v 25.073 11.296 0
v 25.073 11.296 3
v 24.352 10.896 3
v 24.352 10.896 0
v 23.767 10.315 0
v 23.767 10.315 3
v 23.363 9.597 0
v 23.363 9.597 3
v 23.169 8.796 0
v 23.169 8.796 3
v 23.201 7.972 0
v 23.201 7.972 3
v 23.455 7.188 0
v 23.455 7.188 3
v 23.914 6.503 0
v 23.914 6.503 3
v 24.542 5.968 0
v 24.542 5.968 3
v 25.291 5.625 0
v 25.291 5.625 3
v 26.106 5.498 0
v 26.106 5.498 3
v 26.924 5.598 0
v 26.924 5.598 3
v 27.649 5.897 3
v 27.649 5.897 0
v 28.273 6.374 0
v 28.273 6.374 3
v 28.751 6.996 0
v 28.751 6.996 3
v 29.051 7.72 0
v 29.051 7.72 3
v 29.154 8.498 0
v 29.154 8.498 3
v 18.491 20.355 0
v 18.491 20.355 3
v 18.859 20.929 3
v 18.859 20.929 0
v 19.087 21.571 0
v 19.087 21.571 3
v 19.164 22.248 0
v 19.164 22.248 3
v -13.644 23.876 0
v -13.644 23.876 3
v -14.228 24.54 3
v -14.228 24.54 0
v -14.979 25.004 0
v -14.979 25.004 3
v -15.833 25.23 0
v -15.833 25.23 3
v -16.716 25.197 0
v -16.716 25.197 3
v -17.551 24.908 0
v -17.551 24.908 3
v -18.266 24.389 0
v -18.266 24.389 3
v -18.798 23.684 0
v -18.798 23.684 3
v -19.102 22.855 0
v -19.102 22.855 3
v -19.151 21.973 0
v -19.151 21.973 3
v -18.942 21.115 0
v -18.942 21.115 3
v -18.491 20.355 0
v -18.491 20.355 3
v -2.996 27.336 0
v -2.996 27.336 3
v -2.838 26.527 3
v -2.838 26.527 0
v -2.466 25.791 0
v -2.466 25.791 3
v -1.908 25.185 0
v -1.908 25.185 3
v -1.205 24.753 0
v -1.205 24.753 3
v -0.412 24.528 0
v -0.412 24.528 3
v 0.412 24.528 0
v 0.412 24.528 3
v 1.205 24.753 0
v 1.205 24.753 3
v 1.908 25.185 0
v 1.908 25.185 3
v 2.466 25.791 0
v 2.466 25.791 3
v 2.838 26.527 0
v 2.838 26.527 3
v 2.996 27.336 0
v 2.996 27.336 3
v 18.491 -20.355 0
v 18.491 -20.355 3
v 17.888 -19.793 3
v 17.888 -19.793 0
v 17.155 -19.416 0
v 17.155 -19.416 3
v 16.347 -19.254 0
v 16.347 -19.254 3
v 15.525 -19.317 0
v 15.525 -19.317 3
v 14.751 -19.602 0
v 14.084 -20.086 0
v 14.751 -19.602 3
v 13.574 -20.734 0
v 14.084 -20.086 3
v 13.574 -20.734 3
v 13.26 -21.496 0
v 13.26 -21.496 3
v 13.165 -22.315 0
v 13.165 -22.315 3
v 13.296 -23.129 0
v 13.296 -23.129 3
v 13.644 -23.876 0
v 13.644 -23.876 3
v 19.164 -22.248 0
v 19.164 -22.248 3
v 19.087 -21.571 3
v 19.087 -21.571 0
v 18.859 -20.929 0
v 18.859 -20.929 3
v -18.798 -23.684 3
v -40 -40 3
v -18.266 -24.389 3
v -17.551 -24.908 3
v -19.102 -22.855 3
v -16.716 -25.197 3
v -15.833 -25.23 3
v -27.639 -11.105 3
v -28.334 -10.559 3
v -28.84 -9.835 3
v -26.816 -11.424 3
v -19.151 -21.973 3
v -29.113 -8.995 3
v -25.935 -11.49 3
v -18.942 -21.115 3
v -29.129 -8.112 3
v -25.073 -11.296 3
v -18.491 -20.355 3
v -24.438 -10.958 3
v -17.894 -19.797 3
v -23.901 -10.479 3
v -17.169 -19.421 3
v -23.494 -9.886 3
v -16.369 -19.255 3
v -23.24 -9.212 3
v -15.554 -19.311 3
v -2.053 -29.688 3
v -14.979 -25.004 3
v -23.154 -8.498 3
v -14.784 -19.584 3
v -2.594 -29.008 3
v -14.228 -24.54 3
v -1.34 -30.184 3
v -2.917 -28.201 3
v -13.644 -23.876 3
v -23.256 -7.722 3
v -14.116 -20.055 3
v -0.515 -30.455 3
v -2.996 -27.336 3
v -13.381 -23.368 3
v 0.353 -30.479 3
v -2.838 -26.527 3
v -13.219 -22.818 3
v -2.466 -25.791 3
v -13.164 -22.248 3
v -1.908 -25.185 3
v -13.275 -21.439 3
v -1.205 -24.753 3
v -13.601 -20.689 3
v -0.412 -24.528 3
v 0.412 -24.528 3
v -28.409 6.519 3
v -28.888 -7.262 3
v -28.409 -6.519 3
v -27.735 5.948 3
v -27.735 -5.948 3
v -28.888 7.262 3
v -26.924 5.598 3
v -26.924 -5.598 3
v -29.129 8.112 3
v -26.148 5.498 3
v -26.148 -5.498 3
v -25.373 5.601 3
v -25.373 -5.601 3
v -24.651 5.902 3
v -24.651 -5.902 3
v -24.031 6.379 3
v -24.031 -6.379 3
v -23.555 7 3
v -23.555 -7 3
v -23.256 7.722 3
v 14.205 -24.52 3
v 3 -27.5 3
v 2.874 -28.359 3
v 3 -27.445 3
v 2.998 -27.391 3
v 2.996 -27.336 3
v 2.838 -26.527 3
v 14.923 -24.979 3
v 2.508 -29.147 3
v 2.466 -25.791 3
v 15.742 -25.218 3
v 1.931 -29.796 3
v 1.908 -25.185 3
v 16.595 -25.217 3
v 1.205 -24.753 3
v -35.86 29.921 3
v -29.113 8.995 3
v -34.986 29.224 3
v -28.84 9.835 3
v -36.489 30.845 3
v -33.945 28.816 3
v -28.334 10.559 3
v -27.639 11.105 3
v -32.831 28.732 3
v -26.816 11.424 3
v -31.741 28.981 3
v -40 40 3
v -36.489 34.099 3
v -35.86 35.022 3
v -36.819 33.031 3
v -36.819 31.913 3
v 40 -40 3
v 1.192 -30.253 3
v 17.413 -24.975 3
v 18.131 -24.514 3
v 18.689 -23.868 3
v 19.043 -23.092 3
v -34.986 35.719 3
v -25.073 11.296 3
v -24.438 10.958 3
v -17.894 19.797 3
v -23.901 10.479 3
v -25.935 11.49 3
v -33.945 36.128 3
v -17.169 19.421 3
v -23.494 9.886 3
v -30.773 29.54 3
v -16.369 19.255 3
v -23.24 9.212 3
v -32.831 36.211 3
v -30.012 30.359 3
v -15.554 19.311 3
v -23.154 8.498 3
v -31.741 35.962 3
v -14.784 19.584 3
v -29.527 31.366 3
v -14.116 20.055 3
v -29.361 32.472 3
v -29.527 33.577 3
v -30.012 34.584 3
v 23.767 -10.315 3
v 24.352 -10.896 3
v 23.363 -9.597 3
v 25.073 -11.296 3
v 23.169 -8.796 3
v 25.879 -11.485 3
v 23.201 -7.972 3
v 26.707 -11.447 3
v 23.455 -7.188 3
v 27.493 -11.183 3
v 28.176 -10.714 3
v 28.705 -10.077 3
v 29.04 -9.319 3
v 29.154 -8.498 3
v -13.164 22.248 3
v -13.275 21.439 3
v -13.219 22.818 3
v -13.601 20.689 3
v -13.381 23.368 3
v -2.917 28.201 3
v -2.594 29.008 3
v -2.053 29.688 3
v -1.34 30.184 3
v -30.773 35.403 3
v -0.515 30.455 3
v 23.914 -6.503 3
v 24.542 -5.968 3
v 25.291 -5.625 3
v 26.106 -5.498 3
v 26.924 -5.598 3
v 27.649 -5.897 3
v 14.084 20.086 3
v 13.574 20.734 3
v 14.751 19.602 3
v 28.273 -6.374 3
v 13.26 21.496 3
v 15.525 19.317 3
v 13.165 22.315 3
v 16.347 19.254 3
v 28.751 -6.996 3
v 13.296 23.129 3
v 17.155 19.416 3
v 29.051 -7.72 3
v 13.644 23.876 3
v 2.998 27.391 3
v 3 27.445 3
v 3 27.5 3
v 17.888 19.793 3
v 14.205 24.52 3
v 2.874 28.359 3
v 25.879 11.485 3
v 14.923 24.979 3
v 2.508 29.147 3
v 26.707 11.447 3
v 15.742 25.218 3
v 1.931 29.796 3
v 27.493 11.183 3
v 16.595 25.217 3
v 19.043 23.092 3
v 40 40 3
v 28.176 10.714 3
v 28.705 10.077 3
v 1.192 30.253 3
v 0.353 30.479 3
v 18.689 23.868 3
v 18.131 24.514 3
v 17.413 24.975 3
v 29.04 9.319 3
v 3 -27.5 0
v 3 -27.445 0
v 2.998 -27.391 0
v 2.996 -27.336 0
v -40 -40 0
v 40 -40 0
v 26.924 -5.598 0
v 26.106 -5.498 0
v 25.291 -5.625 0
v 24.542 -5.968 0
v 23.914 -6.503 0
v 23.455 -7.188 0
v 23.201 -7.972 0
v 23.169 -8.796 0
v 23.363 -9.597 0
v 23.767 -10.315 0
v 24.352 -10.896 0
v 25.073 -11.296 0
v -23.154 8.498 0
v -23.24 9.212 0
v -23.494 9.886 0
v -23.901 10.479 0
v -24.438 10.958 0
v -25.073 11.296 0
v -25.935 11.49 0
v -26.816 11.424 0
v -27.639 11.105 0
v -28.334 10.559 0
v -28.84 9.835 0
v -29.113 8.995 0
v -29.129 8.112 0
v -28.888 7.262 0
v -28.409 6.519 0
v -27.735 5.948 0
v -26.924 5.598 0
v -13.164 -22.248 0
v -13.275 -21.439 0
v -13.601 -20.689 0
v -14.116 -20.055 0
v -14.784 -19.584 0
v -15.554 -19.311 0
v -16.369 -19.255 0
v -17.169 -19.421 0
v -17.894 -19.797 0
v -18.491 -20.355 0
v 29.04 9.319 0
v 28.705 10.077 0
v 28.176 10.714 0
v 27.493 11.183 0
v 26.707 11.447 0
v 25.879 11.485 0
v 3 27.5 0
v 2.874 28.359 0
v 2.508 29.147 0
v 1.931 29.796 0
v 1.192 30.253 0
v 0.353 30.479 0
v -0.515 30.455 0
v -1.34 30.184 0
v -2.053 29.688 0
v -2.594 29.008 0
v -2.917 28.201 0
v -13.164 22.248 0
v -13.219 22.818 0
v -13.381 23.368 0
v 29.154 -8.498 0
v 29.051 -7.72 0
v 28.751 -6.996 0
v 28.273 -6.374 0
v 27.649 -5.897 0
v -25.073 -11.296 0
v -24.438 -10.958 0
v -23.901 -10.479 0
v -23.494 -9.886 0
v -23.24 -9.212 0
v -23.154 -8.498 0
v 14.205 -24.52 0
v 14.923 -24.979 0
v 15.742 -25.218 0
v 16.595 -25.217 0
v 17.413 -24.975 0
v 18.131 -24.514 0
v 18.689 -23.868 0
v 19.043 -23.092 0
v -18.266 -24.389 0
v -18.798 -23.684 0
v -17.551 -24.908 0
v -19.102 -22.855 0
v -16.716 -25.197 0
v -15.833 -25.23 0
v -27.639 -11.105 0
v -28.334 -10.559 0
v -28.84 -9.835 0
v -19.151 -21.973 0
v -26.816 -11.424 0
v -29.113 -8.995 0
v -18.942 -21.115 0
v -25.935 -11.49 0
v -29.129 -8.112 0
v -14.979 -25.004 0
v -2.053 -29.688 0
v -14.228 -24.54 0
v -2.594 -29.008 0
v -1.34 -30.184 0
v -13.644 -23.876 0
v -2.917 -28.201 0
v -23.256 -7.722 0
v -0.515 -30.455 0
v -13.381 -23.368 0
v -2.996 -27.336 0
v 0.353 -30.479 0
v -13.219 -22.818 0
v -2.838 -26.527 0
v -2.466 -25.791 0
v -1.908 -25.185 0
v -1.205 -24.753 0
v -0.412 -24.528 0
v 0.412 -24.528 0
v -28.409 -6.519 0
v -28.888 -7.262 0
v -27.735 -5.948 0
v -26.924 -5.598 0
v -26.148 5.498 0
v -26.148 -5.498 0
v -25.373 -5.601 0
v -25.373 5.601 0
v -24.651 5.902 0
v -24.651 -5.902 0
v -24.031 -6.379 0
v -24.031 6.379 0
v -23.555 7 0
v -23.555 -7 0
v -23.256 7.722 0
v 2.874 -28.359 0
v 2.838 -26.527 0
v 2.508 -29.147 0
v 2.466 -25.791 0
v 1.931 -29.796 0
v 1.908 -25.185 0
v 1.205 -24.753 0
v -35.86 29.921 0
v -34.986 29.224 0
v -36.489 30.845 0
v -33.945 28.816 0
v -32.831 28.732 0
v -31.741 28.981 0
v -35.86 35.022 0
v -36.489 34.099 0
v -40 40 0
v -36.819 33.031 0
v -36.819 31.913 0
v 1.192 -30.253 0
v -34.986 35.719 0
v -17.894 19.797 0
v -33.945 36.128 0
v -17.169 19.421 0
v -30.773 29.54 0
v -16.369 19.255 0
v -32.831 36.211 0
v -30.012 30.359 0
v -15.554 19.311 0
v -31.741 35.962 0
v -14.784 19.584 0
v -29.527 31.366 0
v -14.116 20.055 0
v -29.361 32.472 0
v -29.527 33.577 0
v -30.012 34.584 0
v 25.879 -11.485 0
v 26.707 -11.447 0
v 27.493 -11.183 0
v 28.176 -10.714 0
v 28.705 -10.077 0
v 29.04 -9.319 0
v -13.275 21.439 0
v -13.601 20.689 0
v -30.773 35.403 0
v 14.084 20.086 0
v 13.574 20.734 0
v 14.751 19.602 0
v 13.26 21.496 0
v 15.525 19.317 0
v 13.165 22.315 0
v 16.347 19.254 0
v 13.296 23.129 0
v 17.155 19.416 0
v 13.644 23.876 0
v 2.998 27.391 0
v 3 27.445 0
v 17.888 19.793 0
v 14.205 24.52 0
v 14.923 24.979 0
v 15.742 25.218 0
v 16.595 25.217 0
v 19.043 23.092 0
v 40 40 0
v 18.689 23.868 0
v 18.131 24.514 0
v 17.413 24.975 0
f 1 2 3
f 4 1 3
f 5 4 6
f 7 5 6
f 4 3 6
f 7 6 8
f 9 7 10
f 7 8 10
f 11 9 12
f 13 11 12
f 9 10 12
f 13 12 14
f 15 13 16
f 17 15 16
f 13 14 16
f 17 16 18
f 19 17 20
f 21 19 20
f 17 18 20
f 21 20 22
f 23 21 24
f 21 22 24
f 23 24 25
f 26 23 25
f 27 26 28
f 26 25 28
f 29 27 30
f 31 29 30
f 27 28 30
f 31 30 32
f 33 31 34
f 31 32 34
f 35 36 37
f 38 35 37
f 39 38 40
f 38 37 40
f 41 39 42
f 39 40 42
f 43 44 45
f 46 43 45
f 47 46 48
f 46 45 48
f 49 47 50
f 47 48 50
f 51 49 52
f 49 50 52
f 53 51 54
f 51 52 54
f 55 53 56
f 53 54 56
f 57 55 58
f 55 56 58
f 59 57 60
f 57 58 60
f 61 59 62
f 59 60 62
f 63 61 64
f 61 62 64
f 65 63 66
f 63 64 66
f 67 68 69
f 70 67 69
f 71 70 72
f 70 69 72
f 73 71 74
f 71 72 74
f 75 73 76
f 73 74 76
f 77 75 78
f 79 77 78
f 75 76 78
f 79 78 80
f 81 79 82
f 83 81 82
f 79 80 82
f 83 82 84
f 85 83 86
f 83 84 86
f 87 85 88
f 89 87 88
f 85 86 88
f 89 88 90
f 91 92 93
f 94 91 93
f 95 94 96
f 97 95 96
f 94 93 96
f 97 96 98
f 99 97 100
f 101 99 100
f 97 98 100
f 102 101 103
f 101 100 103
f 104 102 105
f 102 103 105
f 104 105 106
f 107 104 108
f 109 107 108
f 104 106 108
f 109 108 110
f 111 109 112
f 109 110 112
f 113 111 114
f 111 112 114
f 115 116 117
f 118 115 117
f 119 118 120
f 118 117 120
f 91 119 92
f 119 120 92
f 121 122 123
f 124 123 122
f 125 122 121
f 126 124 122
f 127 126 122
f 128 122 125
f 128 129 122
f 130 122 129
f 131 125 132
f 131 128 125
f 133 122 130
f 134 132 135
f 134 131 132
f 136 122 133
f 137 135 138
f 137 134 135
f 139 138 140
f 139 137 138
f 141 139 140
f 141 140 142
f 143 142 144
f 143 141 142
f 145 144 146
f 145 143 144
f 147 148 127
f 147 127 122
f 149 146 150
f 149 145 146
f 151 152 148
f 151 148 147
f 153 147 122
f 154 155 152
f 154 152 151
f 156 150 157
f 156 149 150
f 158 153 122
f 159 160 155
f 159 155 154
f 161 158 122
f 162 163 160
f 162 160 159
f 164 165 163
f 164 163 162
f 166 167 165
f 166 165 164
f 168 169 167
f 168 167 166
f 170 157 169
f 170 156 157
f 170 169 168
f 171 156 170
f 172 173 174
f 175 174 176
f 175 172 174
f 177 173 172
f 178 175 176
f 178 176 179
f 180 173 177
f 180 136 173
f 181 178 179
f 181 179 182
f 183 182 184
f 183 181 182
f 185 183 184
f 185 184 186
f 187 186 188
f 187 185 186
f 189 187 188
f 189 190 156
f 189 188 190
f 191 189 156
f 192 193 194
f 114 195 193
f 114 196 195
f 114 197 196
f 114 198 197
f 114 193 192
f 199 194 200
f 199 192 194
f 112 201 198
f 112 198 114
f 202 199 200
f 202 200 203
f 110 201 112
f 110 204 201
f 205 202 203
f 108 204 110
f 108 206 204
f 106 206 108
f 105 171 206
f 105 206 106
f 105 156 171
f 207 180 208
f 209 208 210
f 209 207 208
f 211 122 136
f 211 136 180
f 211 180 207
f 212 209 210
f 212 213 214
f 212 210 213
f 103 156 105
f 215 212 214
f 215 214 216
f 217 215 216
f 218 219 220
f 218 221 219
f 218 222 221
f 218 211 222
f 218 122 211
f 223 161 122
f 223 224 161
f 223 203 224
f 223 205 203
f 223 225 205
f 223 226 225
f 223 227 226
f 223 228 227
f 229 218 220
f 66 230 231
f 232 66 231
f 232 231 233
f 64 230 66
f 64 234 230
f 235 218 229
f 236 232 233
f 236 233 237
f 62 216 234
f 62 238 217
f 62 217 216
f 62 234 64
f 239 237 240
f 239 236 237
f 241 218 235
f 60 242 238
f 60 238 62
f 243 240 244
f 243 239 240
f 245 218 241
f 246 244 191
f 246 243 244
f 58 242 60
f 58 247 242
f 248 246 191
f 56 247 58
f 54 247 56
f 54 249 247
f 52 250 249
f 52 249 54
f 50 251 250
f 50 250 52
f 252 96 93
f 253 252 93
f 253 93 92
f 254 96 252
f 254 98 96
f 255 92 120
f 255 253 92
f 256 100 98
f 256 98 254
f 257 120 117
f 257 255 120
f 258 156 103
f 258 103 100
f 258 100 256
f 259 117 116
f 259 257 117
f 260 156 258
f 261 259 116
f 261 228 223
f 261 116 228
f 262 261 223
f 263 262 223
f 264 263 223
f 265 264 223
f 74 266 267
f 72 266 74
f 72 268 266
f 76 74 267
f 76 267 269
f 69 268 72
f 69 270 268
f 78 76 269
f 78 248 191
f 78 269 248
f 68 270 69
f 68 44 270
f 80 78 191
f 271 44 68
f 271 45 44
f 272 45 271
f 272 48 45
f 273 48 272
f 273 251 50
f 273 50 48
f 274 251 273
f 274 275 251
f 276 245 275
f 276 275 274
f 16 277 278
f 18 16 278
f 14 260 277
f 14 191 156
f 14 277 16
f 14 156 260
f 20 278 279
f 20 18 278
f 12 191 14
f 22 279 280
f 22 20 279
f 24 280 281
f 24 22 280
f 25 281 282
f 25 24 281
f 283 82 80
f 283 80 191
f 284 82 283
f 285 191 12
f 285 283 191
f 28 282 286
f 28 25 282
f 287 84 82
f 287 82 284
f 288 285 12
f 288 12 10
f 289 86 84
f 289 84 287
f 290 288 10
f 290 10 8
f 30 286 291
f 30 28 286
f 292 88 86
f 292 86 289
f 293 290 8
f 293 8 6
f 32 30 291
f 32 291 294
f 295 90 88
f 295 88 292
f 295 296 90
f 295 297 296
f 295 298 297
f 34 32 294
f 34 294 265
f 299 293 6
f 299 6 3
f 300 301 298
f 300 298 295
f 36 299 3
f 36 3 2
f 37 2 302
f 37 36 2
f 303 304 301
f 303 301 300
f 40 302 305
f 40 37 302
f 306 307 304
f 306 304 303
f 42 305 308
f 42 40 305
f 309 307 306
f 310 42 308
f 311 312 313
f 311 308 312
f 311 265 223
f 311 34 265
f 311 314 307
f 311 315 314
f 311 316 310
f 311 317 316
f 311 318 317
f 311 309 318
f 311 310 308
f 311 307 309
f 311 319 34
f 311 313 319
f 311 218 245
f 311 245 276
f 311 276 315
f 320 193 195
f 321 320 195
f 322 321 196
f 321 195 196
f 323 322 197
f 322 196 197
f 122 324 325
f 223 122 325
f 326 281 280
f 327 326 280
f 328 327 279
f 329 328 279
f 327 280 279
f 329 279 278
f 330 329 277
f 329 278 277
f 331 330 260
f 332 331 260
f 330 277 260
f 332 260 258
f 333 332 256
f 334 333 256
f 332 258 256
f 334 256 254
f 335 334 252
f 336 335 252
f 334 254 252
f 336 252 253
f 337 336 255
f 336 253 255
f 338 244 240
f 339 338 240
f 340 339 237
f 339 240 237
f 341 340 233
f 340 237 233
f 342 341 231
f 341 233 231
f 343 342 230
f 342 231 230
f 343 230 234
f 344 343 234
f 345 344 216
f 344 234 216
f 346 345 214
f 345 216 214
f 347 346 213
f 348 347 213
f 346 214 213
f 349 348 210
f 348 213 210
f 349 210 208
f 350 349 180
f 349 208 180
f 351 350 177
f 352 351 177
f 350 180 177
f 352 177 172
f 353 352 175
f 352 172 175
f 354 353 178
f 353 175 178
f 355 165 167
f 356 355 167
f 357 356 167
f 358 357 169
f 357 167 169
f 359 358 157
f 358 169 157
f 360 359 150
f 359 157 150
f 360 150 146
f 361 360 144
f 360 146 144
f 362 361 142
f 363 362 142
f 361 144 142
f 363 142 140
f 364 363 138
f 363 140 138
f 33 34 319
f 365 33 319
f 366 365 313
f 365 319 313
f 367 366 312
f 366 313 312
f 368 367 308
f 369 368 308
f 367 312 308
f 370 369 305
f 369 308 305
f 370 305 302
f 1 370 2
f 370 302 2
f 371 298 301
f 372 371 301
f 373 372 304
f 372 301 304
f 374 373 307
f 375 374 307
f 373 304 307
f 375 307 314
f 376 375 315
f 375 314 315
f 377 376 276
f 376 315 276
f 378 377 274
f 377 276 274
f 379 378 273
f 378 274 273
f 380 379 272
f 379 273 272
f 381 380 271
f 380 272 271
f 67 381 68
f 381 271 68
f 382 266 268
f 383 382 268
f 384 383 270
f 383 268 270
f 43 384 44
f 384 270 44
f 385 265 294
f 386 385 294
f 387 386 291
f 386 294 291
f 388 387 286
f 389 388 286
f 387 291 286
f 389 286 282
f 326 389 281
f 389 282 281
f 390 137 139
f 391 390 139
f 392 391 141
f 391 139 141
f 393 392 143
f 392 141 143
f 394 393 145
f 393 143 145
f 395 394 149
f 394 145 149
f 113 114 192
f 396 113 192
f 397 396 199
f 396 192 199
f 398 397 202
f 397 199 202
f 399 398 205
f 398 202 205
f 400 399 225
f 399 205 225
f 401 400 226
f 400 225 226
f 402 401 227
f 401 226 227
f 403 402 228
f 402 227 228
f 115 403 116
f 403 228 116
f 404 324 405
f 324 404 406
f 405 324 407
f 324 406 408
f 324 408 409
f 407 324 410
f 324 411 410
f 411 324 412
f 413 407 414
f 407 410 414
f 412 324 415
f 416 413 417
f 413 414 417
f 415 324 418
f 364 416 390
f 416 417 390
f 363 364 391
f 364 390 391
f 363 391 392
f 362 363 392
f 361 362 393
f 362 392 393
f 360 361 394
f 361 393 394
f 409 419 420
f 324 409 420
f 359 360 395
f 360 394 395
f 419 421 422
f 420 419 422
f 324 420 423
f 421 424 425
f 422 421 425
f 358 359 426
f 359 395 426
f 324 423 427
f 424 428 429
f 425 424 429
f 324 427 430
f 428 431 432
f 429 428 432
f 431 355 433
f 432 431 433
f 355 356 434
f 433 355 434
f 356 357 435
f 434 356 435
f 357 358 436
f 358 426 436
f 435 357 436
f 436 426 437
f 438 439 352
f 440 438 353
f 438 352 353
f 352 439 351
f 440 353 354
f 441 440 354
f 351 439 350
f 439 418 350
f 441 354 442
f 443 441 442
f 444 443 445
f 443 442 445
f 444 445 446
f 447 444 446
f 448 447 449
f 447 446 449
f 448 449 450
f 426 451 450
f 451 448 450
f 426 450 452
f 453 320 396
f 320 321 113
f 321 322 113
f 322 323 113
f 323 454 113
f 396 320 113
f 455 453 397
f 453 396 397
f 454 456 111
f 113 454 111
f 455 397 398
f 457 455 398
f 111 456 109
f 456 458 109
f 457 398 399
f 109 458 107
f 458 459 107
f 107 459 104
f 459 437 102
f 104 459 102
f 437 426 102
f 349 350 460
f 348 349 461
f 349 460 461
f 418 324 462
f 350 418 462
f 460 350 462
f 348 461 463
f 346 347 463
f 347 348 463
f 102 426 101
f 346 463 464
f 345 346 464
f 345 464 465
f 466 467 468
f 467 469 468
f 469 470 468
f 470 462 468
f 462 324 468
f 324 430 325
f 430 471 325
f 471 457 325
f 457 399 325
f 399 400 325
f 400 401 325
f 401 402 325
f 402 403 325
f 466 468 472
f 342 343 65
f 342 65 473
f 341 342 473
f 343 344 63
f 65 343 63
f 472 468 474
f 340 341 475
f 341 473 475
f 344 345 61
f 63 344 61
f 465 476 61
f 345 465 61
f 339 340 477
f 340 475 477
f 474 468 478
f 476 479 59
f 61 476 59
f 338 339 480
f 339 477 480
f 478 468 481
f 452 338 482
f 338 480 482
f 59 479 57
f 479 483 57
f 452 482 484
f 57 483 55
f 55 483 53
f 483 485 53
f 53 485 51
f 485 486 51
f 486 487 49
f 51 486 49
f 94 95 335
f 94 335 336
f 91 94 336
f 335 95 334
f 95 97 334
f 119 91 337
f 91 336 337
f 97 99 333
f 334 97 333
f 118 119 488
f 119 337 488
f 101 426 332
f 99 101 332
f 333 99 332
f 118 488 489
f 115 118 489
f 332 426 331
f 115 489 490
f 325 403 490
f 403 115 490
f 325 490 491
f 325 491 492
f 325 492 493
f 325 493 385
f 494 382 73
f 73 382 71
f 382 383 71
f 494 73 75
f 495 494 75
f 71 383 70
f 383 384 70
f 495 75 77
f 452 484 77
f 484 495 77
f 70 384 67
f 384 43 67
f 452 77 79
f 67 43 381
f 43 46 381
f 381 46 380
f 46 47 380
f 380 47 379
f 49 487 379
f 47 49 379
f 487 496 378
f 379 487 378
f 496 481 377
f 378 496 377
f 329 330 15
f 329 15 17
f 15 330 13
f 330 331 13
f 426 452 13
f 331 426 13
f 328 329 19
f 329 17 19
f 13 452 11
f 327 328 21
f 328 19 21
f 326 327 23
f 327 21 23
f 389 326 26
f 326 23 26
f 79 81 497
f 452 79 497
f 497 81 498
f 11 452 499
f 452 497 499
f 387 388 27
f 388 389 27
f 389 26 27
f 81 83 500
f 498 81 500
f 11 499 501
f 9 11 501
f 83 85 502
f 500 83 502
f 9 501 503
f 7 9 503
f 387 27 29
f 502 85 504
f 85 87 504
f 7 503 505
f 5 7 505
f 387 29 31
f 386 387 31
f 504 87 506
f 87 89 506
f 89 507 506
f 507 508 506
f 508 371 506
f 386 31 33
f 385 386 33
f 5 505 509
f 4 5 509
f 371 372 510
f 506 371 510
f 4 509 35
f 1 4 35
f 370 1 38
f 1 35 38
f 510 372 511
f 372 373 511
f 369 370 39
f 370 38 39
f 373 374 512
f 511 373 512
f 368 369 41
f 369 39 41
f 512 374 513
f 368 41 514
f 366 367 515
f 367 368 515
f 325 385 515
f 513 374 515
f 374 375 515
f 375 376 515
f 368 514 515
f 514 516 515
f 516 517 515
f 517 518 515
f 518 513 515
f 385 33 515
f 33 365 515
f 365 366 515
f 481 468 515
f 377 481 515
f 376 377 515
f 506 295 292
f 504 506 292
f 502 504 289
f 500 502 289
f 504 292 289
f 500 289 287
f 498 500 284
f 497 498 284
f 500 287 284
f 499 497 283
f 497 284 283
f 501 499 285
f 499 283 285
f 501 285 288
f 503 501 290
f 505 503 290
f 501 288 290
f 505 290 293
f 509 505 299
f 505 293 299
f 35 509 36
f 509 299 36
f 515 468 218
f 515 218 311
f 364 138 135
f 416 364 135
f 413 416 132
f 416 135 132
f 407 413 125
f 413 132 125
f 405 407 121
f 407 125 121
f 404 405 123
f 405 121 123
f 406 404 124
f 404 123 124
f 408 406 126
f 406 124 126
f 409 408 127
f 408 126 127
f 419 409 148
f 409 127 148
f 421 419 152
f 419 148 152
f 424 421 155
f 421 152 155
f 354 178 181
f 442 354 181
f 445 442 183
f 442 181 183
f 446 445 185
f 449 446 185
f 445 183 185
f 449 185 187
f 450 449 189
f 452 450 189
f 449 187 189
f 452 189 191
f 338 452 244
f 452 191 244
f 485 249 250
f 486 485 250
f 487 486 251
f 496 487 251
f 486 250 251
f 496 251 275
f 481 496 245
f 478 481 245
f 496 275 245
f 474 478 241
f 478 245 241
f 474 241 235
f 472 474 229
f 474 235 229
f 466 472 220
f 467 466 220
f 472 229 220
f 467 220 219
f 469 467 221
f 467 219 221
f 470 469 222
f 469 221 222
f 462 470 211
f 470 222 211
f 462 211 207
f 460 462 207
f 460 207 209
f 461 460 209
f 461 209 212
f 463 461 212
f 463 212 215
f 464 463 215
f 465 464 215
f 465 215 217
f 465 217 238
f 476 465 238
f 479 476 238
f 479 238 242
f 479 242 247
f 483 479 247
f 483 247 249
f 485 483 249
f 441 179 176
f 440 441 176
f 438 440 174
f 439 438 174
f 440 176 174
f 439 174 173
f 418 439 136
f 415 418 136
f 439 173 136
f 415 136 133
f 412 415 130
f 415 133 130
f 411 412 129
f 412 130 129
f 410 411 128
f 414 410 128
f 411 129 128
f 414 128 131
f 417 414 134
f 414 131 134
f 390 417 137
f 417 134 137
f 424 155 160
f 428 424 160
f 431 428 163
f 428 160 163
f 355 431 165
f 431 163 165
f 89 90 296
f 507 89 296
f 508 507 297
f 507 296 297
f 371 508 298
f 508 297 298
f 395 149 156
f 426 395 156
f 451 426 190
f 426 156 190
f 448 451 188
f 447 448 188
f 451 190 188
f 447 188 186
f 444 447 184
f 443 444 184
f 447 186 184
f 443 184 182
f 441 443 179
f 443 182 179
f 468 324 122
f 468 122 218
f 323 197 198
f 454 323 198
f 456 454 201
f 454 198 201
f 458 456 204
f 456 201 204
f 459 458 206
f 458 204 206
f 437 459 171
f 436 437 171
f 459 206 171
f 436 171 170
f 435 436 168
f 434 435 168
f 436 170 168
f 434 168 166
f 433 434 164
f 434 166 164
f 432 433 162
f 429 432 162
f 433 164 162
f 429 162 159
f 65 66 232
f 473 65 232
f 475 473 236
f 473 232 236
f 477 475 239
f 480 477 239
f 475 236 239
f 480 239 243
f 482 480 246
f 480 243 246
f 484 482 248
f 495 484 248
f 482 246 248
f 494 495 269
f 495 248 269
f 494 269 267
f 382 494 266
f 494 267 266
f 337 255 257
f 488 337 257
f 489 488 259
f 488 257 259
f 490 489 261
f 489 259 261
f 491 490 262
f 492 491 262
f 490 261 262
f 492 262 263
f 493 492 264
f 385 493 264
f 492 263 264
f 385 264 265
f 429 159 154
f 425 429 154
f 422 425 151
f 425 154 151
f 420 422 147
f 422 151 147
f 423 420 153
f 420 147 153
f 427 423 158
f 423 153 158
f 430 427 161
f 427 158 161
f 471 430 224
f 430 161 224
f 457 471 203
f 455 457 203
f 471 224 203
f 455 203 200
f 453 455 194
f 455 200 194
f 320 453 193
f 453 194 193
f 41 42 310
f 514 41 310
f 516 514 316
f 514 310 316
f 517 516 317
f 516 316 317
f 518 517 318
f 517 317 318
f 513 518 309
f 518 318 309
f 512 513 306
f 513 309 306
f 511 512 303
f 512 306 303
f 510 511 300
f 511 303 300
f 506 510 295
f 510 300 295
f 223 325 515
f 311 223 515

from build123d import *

# Parameters (mm, degrees)
F0_W     = 80
F0_H     = 80
F1_DEPTH = 3
F3_DEPTH = 25
F4_R     = 3.75
F5_DEPTH = 25


with BuildPart() as f1:
    # F0 (on Top) → F1 (new body)
    with BuildSketch(Plane.XY):
        Rectangle(F0_W, F0_H)
    extrude(amount=F1_DEPTH)

    # F2 (on face) → F3 (cut)
    with BuildSketch(Plane.XY.offset(3)):
        with BuildLine():
            ThreePointArc((25.0727558965, 11.2963229308), (23.3008846492, 7.5709163622), (26.9240976399, 5.5984789253))
            ThreePointArc((26.9240976399, 5.5984789253), (26.1540541981, 8.4979673453), (25.0727558965, 11.2963229308))
        make_face()
        with BuildLine():
            ThreePointArc((25.0727558965, 11.2963229308), (26.1540541981, 8.4979673453), (26.9240976399, 5.5984789253))
            ThreePointArc((26.9240976399, 5.5984789253), (28.5320922892, 6.669051044), (29.1540541981, 8.4979673453))
            ThreePointArc((29.1540541981, 8.4979673453), (27.8505366022, 10.9722242949), (25.0727558965, 11.2963229308))
        make_face()
        with BuildLine():
            ThreePointArc((29.1540541981, -8.4979673453), (28.5320922892, -6.669051044), (26.9240976399, -5.5984789253))
            ThreePointArc((26.9240976399, -5.5984789253), (26.1540541981, -8.4979673453), (25.0727558965, -11.2963229308))
            ThreePointArc((25.0727558965, -11.2963229308), (27.8505366022, -10.9722242949), (29.1540541981, -8.4979673453))
        make_face()
        with BuildLine():
            ThreePointArc((25.0727558965, -11.2963229308), (26.1540541981, -8.4979673453), (26.9240976399, -5.5984789253))
            ThreePointArc((26.9240976399, -5.5984789253), (23.3008846492, -7.5709163622), (25.0727558965, -11.2963229308))
        make_face()
        with BuildLine():
            ThreePointArc((13.6444735922, 23.8763133752), (14.4007386812, 19.8209163622), (18.4913492013, 20.3548521172))
            ThreePointArc((18.4913492013, 20.3548521172), (16.164094438, 22.2479673453), (13.6444735922, 23.8763133752))
        make_face()
        with BuildLine():
            ThreePointArc((13.6444735922, 23.8763133752), (16.164094438, 22.2479673453), (18.4913492013, 20.3548521172))
            ThreePointArc((18.4913492013, 20.3548521172), (18.990909279, 21.2434187626), (19.164094438, 22.2479673453))
            ThreePointArc((19.164094438, 22.2479673453), (17.0129576374, 25.1253674337), (13.6444735922, 23.8763133752))
        make_face()
        with BuildLine():
            ThreePointArc((19.164094438, -22.2479673453), (18.990909279, -21.2434187626), (18.4913492013, -20.3548521172))
            ThreePointArc((18.4913492013, -20.3548521172), (16.164094438, -22.2479673453), (13.6444735922, -23.8763133752))
            ThreePointArc((13.6444735922, -23.8763133752), (17.0129576374, -25.1253674337), (19.164094438, -22.2479673453))
        make_face()
        with BuildLine():
            ThreePointArc((13.6444735922, -23.8763133752), (16.164094438, -22.2479673453), (18.4913492013, -20.3548521172))
            ThreePointArc((18.4913492013, -20.3548521172), (14.4007386812, -19.8209163622), (13.6444735922, -23.8763133752))
        make_face()
        with BuildLine():
            ThreePointArc((-2.9955338657, 27.3363636364), (0, 24.5), (2.9955338657, 27.3363636364))
            ThreePointArc((2.9955338657, 27.3363636364), (0, 27.5), (-2.9955338657, 27.3363636364))
        make_face()
        with BuildLine():
            ThreePointArc((-2.9955338657, 27.3363636364), (0, 27.5), (2.9955338657, 27.3363636364))
            ThreePointArc((2.9955338657, 27.3363636364), (2.9988832586, 27.4181513503), (3, 27.5))
            ThreePointArc((3, 27.5), (-0.0818486497, 30.4988832586), (-2.9955338657, 27.3363636364))
        make_face()
        with BuildLine():
            ThreePointArc((3, -27.5), (2.9988832586, -27.4181513503), (2.9955338657, -27.3363636364))
            ThreePointArc((2.9955338657, -27.3363636364), (0, -27.5), (-2.9955338657, -27.3363636364))
            ThreePointArc((-2.9955338657, -27.3363636364), (-0.0818486497, -30.4988832586), (3, -27.5))
        make_face()
        with BuildLine():
            ThreePointArc((-2.9955338657, -27.3363636364), (0, -27.5), (2.9955338657, -27.3363636364))
            ThreePointArc((2.9955338657, -27.3363636364), (0, -24.5), (-2.9955338657, -27.3363636364))
        make_face()
        with BuildLine():
            ThreePointArc((-13.164094438, 22.2479673453), (-13.2866943496, 23.0968305447), (-13.6444735922, 23.8763133752))
            ThreePointArc((-13.6444735922, 23.8763133752), (-16.164094438, 22.2479673453), (-18.4913492013, 20.3548521172))
            ThreePointArc((-18.4913492013, 20.3548521172), (-15.1595458553, 19.4211525044), (-13.164094438, 22.2479673453))
        make_face()
        with BuildLine():
            ThreePointArc((-18.4913492013, 20.3548521172), (-16.164094438, 22.2479673453), (-13.6444735922, 23.8763133752))
            ThreePointArc((-13.6444735922, 23.8763133752), (-17.9274501949, 24.6750183284), (-18.4913492013, 20.3548521172))
        make_face()
        with BuildLine():
            ThreePointArc((-18.4913492013, -20.3548521172), (-17.9274501949, -24.6750183284), (-13.6444735922, -23.8763133752))
            ThreePointArc((-13.6444735922, -23.8763133752), (-16.164094438, -22.2479673453), (-18.4913492013, -20.3548521172))
        make_face()
        with BuildLine():
            ThreePointArc((-18.4913492013, -20.3548521172), (-16.164094438, -22.2479673453), (-13.6444735922, -23.8763133752))
            ThreePointArc((-13.6444735922, -23.8763133752), (-13.2866943496, -23.0968305447), (-13.164094438, -22.2479673453))
            ThreePointArc((-13.164094438, -22.2479673453), (-15.1595458553, -19.4211525044), (-18.4913492013, -20.3548521172))
        make_face()
        with BuildLine():
            ThreePointArc((-23.1540541981, 8.4979673453), (-23.6797972485, 10.1944497494), (-25.0727558965, 11.2963229308))
            ThreePointArc((-25.0727558965, 11.2963229308), (-26.1540541981, 8.4979673453), (-26.9240976399, 5.5984789253))
            ThreePointArc((-26.9240976399, 5.5984789253), (-24.3251378968, 6.1199292542), (-23.1540541981, 8.4979673453))
        make_face()
        with BuildLine():
            ThreePointArc((-26.9240976399, 5.5984789253), (-26.1540541981, 8.4979673453), (-25.0727558965, 11.2963229308))
            ThreePointArc((-25.0727558965, 11.2963229308), (-29.007223747, 9.4250183284), (-26.9240976399, 5.5984789253))
        make_face()
        with BuildLine():
            ThreePointArc((-26.9240976399, -5.5984789253), (-29.007223747, -9.4250183284), (-25.0727558965, -11.2963229308))
            ThreePointArc((-25.0727558965, -11.2963229308), (-26.1540541981, -8.4979673453), (-26.9240976399, -5.5984789253))
        make_face()
        with BuildLine():
            ThreePointArc((-26.9240976399, -5.5984789253), (-26.1540541981, -8.4979673453), (-25.0727558965, -11.2963229308))
            ThreePointArc((-25.0727558965, -11.2963229308), (-23.6797972485, -10.1944497494), (-23.1540541981, -8.4979673453))
            ThreePointArc((-23.1540541981, -8.4979673453), (-24.3251378968, -6.1199292542), (-26.9240976399, -5.5984789253))
        make_face()
    extrude(amount=-F3_DEPTH, mode=Mode.SUBTRACT)

    # F4 (on face) → F5 (cut)
    with BuildSketch(Plane.XY.offset(3)):
        with Locations((-33.1107974052, 32.4715934694)):
            Circle(F4_R)
    extrude(amount=-F5_DEPTH, mode=Mode.SUBTRACT)


solid = f1.part
